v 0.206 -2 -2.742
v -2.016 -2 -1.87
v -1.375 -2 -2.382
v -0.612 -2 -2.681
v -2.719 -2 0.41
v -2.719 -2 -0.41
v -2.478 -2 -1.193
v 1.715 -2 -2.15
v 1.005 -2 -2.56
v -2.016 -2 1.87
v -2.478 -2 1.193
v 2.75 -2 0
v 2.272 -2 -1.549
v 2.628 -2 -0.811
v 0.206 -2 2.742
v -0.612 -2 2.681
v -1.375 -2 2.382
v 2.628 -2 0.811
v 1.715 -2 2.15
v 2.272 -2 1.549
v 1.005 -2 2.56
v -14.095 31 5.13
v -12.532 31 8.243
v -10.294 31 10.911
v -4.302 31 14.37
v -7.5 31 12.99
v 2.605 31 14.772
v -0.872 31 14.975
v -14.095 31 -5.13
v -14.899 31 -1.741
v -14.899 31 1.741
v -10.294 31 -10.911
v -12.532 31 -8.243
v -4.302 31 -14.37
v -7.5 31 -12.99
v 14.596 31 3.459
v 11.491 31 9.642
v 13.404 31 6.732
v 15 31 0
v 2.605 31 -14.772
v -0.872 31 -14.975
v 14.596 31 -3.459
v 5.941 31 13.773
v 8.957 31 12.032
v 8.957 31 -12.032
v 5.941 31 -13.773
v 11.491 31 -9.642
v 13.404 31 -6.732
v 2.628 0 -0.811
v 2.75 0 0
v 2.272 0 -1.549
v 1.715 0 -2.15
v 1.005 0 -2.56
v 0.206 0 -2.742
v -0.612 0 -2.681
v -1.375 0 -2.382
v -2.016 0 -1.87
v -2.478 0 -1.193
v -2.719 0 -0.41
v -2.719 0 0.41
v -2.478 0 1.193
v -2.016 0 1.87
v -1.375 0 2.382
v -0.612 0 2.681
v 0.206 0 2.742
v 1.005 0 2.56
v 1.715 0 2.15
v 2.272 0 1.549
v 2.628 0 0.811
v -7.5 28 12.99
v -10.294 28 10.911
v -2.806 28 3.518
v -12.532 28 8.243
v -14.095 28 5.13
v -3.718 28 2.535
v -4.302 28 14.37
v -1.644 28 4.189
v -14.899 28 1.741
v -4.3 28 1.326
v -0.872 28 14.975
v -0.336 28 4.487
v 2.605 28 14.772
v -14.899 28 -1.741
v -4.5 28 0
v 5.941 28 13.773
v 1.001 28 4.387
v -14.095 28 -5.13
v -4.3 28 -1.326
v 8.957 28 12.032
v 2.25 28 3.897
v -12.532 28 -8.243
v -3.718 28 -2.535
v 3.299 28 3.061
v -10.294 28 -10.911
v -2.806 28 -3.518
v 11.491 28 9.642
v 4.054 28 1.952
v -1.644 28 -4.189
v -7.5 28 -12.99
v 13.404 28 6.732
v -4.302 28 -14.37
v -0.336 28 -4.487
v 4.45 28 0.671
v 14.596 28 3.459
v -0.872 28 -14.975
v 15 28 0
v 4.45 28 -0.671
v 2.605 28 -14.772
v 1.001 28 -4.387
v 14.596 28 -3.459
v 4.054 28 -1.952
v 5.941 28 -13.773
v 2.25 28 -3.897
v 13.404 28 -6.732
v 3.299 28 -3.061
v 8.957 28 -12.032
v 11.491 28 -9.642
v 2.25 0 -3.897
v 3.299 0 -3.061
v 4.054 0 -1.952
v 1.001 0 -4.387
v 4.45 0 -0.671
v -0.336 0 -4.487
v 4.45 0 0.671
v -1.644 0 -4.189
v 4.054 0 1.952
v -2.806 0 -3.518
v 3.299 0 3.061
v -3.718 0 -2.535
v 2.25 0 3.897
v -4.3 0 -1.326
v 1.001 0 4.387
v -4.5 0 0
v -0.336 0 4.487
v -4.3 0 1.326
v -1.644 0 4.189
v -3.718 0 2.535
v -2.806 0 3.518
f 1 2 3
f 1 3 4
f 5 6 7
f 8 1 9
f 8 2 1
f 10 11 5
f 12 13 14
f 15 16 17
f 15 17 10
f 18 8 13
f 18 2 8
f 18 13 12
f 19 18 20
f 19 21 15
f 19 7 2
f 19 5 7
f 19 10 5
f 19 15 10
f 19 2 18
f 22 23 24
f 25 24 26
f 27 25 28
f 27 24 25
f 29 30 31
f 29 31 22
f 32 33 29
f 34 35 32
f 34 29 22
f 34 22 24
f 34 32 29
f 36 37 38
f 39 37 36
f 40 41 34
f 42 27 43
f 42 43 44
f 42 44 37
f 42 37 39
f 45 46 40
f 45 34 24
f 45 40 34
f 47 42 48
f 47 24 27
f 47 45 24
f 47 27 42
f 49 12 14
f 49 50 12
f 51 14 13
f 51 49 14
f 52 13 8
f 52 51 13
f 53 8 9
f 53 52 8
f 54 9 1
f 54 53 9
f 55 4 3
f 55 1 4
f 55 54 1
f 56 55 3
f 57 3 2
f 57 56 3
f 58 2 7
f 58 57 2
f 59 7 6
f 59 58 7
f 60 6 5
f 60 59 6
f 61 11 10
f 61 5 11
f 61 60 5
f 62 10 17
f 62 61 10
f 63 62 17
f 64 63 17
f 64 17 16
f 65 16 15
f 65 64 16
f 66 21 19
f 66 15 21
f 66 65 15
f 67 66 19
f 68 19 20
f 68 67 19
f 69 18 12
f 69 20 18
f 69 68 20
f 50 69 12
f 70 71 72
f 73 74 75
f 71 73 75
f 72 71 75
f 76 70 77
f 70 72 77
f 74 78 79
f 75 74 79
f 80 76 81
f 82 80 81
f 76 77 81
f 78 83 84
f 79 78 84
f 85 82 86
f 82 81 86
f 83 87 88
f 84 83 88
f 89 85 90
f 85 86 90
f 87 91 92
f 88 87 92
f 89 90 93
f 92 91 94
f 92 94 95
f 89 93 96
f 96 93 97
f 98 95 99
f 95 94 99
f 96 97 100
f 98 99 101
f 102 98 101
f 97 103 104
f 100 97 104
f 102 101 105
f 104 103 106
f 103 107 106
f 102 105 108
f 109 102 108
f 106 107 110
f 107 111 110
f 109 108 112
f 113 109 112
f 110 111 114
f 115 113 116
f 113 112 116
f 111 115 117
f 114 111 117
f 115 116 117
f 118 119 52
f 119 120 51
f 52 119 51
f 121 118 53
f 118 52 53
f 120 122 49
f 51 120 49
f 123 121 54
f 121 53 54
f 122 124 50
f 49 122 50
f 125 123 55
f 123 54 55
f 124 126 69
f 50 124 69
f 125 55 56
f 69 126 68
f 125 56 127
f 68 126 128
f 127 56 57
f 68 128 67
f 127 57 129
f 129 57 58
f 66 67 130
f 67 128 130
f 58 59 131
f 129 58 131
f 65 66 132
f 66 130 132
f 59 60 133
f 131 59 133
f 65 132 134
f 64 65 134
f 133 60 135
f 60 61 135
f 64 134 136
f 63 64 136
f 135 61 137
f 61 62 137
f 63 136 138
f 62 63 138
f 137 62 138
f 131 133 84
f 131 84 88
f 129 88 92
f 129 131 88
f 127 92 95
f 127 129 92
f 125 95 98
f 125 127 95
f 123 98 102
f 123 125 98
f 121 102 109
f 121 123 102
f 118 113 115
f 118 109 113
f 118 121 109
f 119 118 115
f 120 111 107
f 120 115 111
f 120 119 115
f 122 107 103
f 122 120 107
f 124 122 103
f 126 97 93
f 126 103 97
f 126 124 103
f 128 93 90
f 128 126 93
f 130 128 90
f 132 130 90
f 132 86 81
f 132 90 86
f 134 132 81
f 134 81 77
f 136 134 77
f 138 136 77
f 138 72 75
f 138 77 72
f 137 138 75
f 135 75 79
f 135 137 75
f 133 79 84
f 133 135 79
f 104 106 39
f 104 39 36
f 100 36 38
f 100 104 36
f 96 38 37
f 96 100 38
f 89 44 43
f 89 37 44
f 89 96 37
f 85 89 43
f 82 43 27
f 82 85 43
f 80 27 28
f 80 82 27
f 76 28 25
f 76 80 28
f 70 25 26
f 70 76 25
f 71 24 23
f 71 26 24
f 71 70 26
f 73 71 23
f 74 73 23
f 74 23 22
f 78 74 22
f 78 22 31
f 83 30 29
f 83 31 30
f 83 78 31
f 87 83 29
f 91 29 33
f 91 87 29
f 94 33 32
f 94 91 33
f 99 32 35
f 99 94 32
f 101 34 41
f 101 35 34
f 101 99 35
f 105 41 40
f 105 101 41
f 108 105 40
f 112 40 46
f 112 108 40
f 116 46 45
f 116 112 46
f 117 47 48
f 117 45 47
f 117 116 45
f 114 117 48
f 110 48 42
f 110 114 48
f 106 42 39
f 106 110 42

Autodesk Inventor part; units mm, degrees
ref_plane "YZ Plane" through (0, 0, 0) normal (1, 0, 0) x (0, 1, 0)
ref_plane "XZ Plane" through (0, 0, 0) normal (0, 1, 0) x (-1, 0, 0)
ref_plane "XY Plane" through (0, 0, 0) normal (0, 0, 1) x (1, 0, 0)
sketch "Sketch1" plane through (0, 0, 0) normal (0, 1, 0) x (-1, 0, 0)
  circle A0 centre (0, 0) radius 4.5
  dimension "d0" = 9
extrude "Extrusion1" add sketch "Sketch1" along normal blind 28
sketch "Sketch2" plane through (0, 0, 0) normal (0, -1, 0) x (1, 0, 0)
  circle A0 centre (0, 0) radius 2.75
  dimension "d3" = 5.5
extrude "Extrusion2" add sketch "Sketch2" along normal blind 2
sketch "Sketch3" plane through (0, 28, 0) normal (0, 1, 0) x (1, 0, 0)
  circle A0 centre (0, 0) radius 2.75 projected
  circle A1 centre (0, 0) radius 15
  dimension "d6" = 30
extrude "Extrusion3" add sketch "Sketch3" along normal blind 3 contours A0 | A1
properties part number "fsrTop"
